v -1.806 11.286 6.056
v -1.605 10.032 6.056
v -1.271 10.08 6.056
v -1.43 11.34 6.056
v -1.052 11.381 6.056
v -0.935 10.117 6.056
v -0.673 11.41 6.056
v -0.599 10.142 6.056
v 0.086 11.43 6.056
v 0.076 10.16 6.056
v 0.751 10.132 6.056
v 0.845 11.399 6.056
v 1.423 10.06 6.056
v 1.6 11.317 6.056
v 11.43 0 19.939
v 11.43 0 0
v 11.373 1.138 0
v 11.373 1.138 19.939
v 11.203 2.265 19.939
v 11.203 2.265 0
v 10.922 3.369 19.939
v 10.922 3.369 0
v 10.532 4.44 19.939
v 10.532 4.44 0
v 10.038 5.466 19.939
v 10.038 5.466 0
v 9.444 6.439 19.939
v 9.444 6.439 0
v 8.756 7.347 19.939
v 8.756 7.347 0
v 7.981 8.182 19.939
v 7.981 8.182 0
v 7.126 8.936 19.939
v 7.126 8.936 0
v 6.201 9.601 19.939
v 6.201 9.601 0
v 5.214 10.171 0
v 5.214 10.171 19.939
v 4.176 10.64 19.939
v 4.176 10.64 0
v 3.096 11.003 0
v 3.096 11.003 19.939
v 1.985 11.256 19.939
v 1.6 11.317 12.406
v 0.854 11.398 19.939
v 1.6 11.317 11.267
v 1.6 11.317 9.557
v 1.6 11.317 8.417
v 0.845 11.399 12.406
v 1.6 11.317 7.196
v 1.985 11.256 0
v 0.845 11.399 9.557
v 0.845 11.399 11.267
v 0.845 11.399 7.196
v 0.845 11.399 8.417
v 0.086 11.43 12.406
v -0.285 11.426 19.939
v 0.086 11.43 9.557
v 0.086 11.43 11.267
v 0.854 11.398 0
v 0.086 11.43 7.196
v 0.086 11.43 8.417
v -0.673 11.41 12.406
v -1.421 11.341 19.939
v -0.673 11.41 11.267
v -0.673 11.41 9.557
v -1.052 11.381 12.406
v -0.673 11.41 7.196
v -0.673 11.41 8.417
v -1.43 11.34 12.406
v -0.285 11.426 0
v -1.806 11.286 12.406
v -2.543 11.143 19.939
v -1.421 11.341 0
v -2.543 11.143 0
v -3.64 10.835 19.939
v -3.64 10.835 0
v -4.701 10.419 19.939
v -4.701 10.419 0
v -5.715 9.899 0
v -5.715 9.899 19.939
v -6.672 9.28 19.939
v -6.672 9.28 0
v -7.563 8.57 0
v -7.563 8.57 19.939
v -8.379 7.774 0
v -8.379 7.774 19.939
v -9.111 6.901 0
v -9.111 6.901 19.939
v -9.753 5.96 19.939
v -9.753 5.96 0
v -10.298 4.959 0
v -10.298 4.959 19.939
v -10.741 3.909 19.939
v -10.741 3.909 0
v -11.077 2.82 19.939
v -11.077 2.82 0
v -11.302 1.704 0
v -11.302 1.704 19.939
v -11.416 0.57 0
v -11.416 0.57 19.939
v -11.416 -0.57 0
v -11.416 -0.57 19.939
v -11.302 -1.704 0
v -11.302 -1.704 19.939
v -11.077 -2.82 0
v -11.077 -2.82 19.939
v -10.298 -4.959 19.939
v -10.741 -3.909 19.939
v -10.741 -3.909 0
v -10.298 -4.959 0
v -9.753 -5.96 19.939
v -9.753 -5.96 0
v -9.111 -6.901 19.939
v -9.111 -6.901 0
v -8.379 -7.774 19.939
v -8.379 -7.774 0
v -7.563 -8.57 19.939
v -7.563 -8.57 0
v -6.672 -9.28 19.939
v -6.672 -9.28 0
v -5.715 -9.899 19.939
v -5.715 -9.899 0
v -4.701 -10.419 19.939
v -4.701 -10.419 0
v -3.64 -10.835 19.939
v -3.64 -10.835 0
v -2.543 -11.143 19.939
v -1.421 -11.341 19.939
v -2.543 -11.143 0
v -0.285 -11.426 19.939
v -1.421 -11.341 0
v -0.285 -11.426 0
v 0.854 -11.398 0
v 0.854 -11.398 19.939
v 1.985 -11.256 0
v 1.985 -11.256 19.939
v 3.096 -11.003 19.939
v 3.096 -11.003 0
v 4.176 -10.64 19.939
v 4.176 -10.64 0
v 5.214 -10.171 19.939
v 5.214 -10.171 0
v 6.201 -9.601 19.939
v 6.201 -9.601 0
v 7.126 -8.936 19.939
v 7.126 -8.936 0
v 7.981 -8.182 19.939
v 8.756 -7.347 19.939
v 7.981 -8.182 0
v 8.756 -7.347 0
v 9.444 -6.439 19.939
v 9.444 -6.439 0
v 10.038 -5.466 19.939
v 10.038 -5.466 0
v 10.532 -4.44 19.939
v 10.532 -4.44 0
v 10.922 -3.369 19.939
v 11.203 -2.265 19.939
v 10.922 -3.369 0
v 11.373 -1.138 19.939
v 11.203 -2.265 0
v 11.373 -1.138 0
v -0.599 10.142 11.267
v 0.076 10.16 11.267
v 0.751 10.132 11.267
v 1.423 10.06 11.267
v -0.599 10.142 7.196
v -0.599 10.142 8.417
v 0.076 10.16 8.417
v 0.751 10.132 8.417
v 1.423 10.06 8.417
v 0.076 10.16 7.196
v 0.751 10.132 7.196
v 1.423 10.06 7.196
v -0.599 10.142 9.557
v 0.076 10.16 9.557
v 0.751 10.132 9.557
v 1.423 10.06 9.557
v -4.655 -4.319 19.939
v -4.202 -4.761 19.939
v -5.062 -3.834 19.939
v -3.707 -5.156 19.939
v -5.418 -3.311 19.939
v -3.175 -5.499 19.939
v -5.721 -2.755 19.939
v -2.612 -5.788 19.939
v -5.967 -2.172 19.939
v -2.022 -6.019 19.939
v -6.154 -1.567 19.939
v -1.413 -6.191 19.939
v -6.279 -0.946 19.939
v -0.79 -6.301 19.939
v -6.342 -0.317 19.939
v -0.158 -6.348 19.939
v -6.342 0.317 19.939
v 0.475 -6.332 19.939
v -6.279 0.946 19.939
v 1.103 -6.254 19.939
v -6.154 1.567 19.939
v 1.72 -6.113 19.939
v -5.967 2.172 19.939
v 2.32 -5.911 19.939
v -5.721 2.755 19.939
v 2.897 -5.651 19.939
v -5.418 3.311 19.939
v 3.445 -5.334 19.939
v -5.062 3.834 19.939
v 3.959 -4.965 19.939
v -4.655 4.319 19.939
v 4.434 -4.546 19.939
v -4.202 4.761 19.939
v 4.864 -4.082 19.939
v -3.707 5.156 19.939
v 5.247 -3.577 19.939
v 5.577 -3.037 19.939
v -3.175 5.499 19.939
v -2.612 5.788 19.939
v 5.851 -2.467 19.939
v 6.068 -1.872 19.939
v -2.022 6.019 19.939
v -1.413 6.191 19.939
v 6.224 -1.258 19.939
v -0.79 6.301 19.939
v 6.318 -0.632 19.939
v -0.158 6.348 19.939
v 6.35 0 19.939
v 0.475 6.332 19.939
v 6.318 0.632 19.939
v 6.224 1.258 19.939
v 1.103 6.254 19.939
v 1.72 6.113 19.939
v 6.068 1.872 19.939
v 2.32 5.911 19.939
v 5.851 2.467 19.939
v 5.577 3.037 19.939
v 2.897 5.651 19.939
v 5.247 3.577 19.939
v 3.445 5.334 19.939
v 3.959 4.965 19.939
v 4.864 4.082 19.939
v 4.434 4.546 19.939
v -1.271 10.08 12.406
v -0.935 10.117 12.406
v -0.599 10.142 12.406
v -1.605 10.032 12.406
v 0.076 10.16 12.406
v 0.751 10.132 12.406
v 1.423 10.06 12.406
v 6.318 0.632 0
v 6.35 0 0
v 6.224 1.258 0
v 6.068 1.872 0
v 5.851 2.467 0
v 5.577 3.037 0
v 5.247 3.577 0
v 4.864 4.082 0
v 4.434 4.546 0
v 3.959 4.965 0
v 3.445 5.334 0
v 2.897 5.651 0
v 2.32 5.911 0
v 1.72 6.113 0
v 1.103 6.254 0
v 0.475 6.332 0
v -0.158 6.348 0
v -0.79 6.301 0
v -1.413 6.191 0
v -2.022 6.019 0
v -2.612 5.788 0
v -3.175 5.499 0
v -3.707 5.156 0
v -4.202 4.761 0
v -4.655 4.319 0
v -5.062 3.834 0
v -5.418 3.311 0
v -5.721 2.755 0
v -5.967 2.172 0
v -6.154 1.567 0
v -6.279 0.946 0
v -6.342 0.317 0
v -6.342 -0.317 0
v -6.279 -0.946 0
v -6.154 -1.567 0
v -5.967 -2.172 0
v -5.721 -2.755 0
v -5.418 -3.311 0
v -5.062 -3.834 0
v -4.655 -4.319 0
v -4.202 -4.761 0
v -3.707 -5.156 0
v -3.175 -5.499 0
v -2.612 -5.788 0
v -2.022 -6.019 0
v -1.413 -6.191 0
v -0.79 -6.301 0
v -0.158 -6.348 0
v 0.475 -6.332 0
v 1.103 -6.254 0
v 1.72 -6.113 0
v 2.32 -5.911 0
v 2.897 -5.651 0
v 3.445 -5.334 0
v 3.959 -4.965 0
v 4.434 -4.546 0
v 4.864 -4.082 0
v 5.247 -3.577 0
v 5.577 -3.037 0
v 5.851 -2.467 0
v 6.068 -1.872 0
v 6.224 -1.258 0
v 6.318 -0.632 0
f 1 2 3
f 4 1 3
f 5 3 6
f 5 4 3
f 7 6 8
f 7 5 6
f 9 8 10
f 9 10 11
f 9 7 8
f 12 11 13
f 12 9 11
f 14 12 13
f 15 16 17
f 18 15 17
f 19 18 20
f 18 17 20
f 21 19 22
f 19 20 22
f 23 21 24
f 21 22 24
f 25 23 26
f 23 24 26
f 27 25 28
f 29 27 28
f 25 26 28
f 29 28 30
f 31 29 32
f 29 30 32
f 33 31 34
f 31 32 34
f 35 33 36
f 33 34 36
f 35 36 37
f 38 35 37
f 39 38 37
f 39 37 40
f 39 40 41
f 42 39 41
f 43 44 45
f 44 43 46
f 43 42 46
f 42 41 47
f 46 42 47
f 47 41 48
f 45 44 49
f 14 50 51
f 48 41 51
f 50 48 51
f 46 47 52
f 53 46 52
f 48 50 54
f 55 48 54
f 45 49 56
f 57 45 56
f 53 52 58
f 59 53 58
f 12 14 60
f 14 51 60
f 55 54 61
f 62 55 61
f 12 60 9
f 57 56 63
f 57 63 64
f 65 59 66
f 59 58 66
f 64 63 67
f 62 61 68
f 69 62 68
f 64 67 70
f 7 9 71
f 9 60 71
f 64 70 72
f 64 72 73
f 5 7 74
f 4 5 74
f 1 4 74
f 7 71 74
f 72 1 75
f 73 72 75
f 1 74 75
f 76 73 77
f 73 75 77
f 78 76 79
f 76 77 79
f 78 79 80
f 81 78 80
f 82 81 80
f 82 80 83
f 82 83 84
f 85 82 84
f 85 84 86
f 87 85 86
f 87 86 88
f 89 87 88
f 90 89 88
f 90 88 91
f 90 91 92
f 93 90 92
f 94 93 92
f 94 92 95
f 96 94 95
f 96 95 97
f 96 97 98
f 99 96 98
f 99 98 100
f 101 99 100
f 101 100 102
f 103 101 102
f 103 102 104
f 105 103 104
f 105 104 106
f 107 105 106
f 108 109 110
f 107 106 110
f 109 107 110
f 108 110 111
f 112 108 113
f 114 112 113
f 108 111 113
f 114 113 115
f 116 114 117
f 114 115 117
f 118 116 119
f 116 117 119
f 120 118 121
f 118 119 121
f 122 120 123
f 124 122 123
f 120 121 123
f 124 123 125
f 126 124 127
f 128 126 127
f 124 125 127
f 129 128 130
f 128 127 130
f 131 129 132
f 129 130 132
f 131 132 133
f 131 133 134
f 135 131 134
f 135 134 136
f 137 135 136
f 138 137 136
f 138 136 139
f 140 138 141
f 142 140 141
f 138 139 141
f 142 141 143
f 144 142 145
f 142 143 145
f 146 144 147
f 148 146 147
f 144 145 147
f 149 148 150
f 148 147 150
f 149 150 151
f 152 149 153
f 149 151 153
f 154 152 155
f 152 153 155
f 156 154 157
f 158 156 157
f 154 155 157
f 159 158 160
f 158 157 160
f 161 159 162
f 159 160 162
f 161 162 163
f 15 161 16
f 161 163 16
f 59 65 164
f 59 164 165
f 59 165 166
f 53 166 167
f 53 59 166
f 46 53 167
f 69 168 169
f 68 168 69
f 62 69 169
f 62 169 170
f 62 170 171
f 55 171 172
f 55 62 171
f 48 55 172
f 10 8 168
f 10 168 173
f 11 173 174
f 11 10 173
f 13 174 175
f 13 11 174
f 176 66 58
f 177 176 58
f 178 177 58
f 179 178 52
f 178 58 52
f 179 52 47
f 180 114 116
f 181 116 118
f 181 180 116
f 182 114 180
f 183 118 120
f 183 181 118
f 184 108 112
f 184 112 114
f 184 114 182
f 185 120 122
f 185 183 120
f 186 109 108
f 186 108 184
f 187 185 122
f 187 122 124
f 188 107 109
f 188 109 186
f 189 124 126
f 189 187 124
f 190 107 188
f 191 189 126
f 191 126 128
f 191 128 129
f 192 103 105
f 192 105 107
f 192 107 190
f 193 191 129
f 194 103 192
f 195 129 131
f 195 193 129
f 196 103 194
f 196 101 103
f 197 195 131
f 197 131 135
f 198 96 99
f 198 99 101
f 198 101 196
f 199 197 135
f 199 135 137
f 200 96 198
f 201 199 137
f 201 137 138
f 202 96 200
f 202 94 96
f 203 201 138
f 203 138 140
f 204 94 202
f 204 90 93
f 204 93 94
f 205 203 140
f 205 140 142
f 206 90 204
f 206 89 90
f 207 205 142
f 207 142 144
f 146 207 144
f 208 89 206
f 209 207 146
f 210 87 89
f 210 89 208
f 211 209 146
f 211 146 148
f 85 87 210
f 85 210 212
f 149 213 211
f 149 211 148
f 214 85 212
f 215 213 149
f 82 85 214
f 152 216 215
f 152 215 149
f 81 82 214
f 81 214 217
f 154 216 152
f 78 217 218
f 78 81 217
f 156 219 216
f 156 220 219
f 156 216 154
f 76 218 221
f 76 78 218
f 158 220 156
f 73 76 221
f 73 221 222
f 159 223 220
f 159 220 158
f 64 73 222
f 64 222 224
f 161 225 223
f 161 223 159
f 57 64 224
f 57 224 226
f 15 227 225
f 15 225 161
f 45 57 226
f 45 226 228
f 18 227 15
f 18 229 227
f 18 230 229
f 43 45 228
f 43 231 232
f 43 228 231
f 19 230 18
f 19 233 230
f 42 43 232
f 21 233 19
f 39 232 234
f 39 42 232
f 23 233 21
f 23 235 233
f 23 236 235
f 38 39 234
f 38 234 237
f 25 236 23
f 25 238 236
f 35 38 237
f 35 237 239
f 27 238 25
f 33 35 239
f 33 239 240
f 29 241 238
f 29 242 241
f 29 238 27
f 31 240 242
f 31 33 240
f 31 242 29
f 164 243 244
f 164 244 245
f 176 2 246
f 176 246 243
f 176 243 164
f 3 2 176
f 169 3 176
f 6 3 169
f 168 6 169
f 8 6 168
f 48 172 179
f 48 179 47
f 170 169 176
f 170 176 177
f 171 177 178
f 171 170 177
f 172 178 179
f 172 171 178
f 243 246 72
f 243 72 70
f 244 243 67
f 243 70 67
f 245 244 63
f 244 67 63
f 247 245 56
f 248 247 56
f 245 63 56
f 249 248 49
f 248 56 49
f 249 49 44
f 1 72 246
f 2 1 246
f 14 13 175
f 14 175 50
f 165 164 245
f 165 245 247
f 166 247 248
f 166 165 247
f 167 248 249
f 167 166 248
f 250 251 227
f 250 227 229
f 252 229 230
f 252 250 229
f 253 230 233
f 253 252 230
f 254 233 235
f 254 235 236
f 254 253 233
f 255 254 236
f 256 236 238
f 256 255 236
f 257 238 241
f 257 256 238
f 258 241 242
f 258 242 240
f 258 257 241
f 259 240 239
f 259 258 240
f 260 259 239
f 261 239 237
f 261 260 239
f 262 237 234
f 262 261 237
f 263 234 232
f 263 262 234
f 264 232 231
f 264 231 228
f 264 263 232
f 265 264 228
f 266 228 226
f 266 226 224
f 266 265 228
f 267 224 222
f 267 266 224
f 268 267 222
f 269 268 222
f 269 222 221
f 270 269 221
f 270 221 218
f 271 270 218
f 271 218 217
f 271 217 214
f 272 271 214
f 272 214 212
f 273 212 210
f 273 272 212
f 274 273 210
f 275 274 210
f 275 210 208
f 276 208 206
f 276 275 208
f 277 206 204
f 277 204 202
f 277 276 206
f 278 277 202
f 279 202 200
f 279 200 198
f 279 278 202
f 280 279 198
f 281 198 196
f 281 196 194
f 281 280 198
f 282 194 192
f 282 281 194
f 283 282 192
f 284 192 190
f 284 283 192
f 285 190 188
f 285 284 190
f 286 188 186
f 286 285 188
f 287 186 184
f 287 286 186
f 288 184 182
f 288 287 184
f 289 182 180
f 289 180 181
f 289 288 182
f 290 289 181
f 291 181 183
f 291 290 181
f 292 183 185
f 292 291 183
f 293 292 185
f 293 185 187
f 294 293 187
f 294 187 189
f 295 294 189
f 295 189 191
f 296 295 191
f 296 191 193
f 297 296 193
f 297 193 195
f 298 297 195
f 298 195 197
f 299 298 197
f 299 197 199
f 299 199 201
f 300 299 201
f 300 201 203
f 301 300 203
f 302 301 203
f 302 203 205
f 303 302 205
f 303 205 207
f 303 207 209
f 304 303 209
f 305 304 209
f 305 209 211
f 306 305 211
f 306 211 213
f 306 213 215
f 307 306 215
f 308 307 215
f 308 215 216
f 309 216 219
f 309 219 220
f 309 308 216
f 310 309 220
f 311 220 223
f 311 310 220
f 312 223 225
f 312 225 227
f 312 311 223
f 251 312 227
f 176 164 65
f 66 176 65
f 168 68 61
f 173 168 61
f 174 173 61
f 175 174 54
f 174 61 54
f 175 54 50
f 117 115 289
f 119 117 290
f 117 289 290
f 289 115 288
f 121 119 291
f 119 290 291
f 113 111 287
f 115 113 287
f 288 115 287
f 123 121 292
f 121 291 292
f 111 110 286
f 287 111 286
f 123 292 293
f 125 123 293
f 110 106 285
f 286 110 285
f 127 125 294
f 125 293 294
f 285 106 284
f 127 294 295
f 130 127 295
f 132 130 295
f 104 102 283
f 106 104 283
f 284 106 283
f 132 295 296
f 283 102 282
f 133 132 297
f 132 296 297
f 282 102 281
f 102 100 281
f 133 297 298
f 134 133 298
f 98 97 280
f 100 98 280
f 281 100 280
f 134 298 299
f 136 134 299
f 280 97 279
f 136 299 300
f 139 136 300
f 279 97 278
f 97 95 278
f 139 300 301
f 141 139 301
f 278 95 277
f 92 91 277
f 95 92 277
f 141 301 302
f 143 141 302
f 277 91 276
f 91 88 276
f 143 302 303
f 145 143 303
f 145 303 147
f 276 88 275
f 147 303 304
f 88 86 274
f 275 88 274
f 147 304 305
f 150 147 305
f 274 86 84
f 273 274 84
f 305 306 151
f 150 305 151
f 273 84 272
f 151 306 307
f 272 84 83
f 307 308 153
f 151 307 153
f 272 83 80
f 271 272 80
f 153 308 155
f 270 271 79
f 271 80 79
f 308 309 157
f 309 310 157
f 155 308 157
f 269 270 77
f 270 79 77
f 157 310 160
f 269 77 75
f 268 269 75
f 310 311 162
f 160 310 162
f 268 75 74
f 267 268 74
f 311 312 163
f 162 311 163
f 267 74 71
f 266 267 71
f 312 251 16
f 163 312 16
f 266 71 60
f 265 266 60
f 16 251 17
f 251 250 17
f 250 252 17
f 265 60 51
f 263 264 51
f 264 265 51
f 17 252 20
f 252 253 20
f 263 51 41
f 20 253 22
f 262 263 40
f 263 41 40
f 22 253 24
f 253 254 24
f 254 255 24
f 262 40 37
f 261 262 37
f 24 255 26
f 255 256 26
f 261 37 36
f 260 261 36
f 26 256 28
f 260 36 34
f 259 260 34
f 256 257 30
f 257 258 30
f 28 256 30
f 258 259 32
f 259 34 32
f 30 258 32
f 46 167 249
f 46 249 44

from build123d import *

# Parameters (mm, degrees)
SKETCH1_R           = 11.43
SKETCH1_R_2         = 6.35
BOSS_EXTRUDE1_DEPTH = 19.939
WRAP1_START         = 6.056366153
WRAP1_DEPTH         = 6.35
WRAP1_2_DEPTH       = 1.13974359
WRAP1_START_2       = 8.417263589
WRAP1_3_DEPTH       = 1.13974359
WRAP1_START_3       = 11.266622564
WRAP1_4_DEPTH       = 1.139743589


# Read off the part's stored shape, not the designer's step: Wrap1
with BuildPart() as part:
    # Sketch1 → Boss-Extrude1 (new body)
    with BuildSketch(Plane.XY):
        Circle(SKETCH1_R)
        Circle(SKETCH1_R_2, mode=Mode.SUBTRACT)
    extrude(amount=BOSS_EXTRUDE1_DEPTH)

    # Wrap1 outline → Wrap1 (cut)
    with BuildSketch(Plane.XY.offset(WRAP1_START)):
        with BuildLine():
            Line((-0.598615526, 10.142349799), (-0.673442467, 11.410143524))
            ThreePointArc((-0.673442467, 11.410143524), (-1.24125177, 11.362402653), (-1.80597624, 11.286423252))
            Line((-1.80597624, 11.286423252), (-1.605312214, 10.032376224))
            ThreePointArc((-1.605312214, 10.032376224), (-1.103334907, 10.099913469), (-0.598615526, 10.142349799))
        make_face()
    extrude(amount=WRAP1_DEPTH, mode=Mode.SUBTRACT)

    # Wrap1 2 outline → Wrap1 2 (cut)
    with BuildSketch(Plane.XY.offset(WRAP1_START)):
        with BuildLine():
            Line((1.422558862, 10.059916813), (1.60037872, 11.317406415))
            ThreePointArc((1.60037872, 11.317406415), (0.465781866, 11.42050556), (-0.673442467, 11.410143524))
            Line((-0.673442467, 11.410143524), (-0.598615526, 10.142349799))
            ThreePointArc((-0.598615526, 10.142349799), (0.414028326, 10.151560498), (1.422558862, 10.059916813))
        make_face()
    extrude(amount=WRAP1_2_DEPTH, mode=Mode.SUBTRACT)

    # Wrap1 3 outline → Wrap1 3 (cut)
    with BuildSketch(Plane.XY.offset(WRAP1_START_2)):
        with BuildLine():
            Line((1.422558862, 10.059916813), (1.60037872, 11.317406415))
            ThreePointArc((1.60037872, 11.317406415), (0.465781866, 11.42050556), (-0.673442467, 11.410143524))
            Line((-0.673442467, 11.410143524), (-0.598615526, 10.142349799))
            ThreePointArc((-0.598615526, 10.142349799), (0.414028326, 10.151560498), (1.422558862, 10.059916813))
        make_face()
    extrude(amount=WRAP1_3_DEPTH, mode=Mode.SUBTRACT)

    # Wrap1 4 outline → Wrap1 4 (cut)
    with BuildSketch(Plane.XY.offset(WRAP1_START_3)):
        with BuildLine():
            Line((1.422558862, 10.059916813), (1.60037872, 11.317406415))
            ThreePointArc((1.60037872, 11.317406415), (0.465781866, 11.42050556), (-0.673442467, 11.410143524))
            Line((-0.673442467, 11.410143524), (-0.598615526, 10.142349799))
            ThreePointArc((-0.598615526, 10.142349799), (0.414028326, 10.151560498), (1.422558862, 10.059916813))
        make_face()
    extrude(amount=WRAP1_4_DEPTH, mode=Mode.SUBTRACT)


solid = part.part
